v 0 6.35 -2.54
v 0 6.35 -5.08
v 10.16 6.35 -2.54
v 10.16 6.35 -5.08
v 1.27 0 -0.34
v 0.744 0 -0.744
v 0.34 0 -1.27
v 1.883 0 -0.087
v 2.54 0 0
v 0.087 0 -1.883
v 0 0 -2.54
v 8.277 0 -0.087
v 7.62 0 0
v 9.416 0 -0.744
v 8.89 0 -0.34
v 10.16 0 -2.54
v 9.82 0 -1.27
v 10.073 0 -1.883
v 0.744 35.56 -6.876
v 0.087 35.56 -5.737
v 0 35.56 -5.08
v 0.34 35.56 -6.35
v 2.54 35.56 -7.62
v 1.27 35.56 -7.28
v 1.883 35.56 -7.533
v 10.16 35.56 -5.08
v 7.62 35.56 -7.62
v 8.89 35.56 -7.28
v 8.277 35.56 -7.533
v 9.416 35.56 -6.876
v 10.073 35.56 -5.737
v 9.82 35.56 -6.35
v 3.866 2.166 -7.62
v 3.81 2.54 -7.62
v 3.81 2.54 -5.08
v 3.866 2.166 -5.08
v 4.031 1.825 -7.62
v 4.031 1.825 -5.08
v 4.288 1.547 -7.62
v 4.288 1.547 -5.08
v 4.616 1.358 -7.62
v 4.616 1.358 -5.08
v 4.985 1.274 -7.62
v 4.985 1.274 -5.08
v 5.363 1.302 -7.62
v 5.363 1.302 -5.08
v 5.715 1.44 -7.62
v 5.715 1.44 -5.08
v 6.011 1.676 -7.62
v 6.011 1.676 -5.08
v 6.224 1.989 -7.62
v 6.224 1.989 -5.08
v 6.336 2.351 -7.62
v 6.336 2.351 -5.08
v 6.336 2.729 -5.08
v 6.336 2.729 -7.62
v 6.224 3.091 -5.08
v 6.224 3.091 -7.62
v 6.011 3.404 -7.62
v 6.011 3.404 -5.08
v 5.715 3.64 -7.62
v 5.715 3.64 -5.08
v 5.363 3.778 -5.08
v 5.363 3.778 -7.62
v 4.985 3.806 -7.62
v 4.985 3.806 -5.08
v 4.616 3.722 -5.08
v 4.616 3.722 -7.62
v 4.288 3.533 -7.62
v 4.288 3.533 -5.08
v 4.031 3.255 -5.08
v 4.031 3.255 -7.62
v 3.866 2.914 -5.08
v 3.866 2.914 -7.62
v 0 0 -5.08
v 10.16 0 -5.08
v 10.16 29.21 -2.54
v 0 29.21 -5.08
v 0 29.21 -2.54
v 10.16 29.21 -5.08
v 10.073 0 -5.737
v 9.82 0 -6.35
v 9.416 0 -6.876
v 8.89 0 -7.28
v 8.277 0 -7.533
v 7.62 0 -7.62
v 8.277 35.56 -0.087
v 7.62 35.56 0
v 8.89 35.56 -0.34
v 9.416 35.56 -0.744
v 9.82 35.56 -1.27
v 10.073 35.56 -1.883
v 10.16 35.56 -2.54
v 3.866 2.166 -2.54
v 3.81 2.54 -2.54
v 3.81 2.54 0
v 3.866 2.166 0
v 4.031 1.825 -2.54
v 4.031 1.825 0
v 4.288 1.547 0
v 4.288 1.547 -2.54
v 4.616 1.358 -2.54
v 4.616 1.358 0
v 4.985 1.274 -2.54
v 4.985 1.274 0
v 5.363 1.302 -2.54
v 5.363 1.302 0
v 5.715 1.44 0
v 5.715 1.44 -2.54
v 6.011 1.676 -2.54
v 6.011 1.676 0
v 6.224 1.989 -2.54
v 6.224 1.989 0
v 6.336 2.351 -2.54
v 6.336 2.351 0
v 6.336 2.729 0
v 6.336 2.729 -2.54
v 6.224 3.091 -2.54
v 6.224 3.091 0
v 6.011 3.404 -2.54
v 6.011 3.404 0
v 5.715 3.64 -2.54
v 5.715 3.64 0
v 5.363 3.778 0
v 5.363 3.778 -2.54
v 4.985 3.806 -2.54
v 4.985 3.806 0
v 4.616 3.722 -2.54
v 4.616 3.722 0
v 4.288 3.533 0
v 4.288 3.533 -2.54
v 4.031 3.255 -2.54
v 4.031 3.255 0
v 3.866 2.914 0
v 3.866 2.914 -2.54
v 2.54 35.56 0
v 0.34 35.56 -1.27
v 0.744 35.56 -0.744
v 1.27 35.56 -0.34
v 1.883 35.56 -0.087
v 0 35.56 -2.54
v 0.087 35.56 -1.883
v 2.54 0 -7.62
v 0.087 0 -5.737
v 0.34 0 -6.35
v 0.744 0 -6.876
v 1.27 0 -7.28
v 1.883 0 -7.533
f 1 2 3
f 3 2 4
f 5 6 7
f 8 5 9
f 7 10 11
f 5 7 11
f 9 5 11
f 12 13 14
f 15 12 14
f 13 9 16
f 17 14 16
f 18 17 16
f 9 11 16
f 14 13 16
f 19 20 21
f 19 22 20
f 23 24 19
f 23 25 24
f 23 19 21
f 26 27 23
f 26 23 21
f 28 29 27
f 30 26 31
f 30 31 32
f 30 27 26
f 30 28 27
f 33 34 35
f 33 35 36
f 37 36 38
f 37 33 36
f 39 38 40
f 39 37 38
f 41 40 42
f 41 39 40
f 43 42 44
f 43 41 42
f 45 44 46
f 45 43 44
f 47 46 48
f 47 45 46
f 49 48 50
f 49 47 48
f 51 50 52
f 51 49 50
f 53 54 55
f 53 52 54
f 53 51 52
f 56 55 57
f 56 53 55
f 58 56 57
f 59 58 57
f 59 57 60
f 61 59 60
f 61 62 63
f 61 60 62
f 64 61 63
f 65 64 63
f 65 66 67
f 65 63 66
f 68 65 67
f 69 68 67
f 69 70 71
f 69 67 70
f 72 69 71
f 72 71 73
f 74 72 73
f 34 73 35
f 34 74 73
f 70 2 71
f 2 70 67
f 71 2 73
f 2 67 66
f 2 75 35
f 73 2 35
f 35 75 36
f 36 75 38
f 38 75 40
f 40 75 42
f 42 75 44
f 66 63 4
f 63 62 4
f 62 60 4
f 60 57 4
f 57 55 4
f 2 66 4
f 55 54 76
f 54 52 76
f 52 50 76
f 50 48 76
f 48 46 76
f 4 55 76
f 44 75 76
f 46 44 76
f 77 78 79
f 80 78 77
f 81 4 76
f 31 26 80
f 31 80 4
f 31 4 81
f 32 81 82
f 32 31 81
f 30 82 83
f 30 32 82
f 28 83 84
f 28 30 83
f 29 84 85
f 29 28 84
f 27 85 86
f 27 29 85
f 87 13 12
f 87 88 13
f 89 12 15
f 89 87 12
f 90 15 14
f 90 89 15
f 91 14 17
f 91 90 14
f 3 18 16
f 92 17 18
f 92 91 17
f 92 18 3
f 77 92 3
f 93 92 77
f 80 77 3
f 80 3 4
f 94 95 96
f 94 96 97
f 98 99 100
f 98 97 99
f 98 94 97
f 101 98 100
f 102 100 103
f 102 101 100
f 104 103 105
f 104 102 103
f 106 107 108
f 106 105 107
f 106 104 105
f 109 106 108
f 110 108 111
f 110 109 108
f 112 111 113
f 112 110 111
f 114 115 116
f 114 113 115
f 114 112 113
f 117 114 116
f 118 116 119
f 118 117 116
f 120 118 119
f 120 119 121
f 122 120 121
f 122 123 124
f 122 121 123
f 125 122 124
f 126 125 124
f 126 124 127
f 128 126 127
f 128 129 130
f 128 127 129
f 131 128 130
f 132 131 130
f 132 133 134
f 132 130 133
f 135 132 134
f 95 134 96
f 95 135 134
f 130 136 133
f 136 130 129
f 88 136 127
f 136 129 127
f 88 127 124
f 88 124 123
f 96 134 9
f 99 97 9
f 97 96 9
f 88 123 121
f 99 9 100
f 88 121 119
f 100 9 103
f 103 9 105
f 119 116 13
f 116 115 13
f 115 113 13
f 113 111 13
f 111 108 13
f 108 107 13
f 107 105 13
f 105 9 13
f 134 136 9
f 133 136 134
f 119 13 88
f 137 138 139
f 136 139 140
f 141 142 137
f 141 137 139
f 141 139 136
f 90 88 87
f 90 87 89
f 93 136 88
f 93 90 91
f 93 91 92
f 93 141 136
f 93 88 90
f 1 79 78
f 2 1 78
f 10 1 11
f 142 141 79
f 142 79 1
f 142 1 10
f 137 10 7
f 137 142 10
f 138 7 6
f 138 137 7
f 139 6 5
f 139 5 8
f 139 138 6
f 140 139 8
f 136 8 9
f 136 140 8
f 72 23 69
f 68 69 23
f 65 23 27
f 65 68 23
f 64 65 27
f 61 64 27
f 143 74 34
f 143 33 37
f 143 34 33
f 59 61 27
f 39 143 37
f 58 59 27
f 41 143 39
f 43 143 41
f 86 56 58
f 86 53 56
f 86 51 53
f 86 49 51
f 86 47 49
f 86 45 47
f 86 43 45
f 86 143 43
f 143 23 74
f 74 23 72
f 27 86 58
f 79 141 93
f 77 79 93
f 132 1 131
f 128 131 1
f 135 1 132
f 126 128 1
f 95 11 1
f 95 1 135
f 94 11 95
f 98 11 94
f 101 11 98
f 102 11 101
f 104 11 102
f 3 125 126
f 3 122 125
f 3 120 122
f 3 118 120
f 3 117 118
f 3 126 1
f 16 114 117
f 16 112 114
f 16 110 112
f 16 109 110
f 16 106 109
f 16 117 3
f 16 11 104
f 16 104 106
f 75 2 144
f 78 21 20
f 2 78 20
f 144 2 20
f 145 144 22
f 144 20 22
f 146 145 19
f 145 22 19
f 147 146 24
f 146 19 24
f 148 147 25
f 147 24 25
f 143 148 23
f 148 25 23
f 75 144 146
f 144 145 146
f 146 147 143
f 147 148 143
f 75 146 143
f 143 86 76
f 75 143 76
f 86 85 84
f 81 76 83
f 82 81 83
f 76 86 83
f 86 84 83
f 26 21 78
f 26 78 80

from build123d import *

# Parameters (mm, degrees)
SKETCH1_W               = 10.16
SKETCH1_H               = 7.62
BOSS_EXTRUDE1_DEPTH     = 35.56
FILLET1_R               = 2.54
SKETCH2_W               = 10.16
SKETCH2_H               = 2.54
CUT_EXTRUDE1_DEPTH      = 6.35
CUT_EXTRUDE2_DEPTH      = 38.759814618
CUT_EXTRUDE2_DEPTH_BACK = 38.759814618
SKETCH3_R               = 1.27


with BuildPart() as part:
    # Sketch1 → Boss-Extrude1 (new body)
    with BuildSketch(Plane(origin=(0, 0, 0), x_dir=(1, 0, 0), z_dir=(0, 1, 0))):
        with Locations((5.08, 3.81)):
            Rectangle(SKETCH1_W, SKETCH1_H)
    extrude(amount=BOSS_EXTRUDE1_DEPTH)

    # Fillet1
    fillet1_edges = [part.edges().sort_by_distance(p)[0] for p in [
        (0, 17.78, -7.62),
        (10.16, 17.78, -7.62),
        (10.16, 17.78, 0),
        (0, 17.78, 0),
    ]]
    fillet(fillet1_edges, radius=FILLET1_R)

    # Sketch2 → Cut-Extrude1 (cut)
    with BuildSketch(Plane(origin=(0, 0, 0), x_dir=(1, 0, 0), z_dir=(0, 1, 0))):
        with Locations((5.08, 3.81)):
            Rectangle(SKETCH2_W, SKETCH2_H)
    cut_extrude1 = extrude(amount=CUT_EXTRUDE1_DEPTH, mode=Mode.SUBTRACT)

    # Mirror1: Cut-Extrude1 across plane
    add(cut_extrude1.mirror(Plane.ZX.offset(17.78)), mode=Mode.SUBTRACT)

    # Sketch3 → Cut-Extrude2 (cut, two sides: drawn at the far end of the back side and taken through both)
    with BuildSketch(Plane.XY.offset(-CUT_EXTRUDE2_DEPTH_BACK)):
        with Locations(Location((5.08, 2.54, 0), (0, 0, 180))):
            Circle(SKETCH3_R)
    extrude(amount=CUT_EXTRUDE2_DEPTH + CUT_EXTRUDE2_DEPTH_BACK, mode=Mode.SUBTRACT)


solid = part.part
